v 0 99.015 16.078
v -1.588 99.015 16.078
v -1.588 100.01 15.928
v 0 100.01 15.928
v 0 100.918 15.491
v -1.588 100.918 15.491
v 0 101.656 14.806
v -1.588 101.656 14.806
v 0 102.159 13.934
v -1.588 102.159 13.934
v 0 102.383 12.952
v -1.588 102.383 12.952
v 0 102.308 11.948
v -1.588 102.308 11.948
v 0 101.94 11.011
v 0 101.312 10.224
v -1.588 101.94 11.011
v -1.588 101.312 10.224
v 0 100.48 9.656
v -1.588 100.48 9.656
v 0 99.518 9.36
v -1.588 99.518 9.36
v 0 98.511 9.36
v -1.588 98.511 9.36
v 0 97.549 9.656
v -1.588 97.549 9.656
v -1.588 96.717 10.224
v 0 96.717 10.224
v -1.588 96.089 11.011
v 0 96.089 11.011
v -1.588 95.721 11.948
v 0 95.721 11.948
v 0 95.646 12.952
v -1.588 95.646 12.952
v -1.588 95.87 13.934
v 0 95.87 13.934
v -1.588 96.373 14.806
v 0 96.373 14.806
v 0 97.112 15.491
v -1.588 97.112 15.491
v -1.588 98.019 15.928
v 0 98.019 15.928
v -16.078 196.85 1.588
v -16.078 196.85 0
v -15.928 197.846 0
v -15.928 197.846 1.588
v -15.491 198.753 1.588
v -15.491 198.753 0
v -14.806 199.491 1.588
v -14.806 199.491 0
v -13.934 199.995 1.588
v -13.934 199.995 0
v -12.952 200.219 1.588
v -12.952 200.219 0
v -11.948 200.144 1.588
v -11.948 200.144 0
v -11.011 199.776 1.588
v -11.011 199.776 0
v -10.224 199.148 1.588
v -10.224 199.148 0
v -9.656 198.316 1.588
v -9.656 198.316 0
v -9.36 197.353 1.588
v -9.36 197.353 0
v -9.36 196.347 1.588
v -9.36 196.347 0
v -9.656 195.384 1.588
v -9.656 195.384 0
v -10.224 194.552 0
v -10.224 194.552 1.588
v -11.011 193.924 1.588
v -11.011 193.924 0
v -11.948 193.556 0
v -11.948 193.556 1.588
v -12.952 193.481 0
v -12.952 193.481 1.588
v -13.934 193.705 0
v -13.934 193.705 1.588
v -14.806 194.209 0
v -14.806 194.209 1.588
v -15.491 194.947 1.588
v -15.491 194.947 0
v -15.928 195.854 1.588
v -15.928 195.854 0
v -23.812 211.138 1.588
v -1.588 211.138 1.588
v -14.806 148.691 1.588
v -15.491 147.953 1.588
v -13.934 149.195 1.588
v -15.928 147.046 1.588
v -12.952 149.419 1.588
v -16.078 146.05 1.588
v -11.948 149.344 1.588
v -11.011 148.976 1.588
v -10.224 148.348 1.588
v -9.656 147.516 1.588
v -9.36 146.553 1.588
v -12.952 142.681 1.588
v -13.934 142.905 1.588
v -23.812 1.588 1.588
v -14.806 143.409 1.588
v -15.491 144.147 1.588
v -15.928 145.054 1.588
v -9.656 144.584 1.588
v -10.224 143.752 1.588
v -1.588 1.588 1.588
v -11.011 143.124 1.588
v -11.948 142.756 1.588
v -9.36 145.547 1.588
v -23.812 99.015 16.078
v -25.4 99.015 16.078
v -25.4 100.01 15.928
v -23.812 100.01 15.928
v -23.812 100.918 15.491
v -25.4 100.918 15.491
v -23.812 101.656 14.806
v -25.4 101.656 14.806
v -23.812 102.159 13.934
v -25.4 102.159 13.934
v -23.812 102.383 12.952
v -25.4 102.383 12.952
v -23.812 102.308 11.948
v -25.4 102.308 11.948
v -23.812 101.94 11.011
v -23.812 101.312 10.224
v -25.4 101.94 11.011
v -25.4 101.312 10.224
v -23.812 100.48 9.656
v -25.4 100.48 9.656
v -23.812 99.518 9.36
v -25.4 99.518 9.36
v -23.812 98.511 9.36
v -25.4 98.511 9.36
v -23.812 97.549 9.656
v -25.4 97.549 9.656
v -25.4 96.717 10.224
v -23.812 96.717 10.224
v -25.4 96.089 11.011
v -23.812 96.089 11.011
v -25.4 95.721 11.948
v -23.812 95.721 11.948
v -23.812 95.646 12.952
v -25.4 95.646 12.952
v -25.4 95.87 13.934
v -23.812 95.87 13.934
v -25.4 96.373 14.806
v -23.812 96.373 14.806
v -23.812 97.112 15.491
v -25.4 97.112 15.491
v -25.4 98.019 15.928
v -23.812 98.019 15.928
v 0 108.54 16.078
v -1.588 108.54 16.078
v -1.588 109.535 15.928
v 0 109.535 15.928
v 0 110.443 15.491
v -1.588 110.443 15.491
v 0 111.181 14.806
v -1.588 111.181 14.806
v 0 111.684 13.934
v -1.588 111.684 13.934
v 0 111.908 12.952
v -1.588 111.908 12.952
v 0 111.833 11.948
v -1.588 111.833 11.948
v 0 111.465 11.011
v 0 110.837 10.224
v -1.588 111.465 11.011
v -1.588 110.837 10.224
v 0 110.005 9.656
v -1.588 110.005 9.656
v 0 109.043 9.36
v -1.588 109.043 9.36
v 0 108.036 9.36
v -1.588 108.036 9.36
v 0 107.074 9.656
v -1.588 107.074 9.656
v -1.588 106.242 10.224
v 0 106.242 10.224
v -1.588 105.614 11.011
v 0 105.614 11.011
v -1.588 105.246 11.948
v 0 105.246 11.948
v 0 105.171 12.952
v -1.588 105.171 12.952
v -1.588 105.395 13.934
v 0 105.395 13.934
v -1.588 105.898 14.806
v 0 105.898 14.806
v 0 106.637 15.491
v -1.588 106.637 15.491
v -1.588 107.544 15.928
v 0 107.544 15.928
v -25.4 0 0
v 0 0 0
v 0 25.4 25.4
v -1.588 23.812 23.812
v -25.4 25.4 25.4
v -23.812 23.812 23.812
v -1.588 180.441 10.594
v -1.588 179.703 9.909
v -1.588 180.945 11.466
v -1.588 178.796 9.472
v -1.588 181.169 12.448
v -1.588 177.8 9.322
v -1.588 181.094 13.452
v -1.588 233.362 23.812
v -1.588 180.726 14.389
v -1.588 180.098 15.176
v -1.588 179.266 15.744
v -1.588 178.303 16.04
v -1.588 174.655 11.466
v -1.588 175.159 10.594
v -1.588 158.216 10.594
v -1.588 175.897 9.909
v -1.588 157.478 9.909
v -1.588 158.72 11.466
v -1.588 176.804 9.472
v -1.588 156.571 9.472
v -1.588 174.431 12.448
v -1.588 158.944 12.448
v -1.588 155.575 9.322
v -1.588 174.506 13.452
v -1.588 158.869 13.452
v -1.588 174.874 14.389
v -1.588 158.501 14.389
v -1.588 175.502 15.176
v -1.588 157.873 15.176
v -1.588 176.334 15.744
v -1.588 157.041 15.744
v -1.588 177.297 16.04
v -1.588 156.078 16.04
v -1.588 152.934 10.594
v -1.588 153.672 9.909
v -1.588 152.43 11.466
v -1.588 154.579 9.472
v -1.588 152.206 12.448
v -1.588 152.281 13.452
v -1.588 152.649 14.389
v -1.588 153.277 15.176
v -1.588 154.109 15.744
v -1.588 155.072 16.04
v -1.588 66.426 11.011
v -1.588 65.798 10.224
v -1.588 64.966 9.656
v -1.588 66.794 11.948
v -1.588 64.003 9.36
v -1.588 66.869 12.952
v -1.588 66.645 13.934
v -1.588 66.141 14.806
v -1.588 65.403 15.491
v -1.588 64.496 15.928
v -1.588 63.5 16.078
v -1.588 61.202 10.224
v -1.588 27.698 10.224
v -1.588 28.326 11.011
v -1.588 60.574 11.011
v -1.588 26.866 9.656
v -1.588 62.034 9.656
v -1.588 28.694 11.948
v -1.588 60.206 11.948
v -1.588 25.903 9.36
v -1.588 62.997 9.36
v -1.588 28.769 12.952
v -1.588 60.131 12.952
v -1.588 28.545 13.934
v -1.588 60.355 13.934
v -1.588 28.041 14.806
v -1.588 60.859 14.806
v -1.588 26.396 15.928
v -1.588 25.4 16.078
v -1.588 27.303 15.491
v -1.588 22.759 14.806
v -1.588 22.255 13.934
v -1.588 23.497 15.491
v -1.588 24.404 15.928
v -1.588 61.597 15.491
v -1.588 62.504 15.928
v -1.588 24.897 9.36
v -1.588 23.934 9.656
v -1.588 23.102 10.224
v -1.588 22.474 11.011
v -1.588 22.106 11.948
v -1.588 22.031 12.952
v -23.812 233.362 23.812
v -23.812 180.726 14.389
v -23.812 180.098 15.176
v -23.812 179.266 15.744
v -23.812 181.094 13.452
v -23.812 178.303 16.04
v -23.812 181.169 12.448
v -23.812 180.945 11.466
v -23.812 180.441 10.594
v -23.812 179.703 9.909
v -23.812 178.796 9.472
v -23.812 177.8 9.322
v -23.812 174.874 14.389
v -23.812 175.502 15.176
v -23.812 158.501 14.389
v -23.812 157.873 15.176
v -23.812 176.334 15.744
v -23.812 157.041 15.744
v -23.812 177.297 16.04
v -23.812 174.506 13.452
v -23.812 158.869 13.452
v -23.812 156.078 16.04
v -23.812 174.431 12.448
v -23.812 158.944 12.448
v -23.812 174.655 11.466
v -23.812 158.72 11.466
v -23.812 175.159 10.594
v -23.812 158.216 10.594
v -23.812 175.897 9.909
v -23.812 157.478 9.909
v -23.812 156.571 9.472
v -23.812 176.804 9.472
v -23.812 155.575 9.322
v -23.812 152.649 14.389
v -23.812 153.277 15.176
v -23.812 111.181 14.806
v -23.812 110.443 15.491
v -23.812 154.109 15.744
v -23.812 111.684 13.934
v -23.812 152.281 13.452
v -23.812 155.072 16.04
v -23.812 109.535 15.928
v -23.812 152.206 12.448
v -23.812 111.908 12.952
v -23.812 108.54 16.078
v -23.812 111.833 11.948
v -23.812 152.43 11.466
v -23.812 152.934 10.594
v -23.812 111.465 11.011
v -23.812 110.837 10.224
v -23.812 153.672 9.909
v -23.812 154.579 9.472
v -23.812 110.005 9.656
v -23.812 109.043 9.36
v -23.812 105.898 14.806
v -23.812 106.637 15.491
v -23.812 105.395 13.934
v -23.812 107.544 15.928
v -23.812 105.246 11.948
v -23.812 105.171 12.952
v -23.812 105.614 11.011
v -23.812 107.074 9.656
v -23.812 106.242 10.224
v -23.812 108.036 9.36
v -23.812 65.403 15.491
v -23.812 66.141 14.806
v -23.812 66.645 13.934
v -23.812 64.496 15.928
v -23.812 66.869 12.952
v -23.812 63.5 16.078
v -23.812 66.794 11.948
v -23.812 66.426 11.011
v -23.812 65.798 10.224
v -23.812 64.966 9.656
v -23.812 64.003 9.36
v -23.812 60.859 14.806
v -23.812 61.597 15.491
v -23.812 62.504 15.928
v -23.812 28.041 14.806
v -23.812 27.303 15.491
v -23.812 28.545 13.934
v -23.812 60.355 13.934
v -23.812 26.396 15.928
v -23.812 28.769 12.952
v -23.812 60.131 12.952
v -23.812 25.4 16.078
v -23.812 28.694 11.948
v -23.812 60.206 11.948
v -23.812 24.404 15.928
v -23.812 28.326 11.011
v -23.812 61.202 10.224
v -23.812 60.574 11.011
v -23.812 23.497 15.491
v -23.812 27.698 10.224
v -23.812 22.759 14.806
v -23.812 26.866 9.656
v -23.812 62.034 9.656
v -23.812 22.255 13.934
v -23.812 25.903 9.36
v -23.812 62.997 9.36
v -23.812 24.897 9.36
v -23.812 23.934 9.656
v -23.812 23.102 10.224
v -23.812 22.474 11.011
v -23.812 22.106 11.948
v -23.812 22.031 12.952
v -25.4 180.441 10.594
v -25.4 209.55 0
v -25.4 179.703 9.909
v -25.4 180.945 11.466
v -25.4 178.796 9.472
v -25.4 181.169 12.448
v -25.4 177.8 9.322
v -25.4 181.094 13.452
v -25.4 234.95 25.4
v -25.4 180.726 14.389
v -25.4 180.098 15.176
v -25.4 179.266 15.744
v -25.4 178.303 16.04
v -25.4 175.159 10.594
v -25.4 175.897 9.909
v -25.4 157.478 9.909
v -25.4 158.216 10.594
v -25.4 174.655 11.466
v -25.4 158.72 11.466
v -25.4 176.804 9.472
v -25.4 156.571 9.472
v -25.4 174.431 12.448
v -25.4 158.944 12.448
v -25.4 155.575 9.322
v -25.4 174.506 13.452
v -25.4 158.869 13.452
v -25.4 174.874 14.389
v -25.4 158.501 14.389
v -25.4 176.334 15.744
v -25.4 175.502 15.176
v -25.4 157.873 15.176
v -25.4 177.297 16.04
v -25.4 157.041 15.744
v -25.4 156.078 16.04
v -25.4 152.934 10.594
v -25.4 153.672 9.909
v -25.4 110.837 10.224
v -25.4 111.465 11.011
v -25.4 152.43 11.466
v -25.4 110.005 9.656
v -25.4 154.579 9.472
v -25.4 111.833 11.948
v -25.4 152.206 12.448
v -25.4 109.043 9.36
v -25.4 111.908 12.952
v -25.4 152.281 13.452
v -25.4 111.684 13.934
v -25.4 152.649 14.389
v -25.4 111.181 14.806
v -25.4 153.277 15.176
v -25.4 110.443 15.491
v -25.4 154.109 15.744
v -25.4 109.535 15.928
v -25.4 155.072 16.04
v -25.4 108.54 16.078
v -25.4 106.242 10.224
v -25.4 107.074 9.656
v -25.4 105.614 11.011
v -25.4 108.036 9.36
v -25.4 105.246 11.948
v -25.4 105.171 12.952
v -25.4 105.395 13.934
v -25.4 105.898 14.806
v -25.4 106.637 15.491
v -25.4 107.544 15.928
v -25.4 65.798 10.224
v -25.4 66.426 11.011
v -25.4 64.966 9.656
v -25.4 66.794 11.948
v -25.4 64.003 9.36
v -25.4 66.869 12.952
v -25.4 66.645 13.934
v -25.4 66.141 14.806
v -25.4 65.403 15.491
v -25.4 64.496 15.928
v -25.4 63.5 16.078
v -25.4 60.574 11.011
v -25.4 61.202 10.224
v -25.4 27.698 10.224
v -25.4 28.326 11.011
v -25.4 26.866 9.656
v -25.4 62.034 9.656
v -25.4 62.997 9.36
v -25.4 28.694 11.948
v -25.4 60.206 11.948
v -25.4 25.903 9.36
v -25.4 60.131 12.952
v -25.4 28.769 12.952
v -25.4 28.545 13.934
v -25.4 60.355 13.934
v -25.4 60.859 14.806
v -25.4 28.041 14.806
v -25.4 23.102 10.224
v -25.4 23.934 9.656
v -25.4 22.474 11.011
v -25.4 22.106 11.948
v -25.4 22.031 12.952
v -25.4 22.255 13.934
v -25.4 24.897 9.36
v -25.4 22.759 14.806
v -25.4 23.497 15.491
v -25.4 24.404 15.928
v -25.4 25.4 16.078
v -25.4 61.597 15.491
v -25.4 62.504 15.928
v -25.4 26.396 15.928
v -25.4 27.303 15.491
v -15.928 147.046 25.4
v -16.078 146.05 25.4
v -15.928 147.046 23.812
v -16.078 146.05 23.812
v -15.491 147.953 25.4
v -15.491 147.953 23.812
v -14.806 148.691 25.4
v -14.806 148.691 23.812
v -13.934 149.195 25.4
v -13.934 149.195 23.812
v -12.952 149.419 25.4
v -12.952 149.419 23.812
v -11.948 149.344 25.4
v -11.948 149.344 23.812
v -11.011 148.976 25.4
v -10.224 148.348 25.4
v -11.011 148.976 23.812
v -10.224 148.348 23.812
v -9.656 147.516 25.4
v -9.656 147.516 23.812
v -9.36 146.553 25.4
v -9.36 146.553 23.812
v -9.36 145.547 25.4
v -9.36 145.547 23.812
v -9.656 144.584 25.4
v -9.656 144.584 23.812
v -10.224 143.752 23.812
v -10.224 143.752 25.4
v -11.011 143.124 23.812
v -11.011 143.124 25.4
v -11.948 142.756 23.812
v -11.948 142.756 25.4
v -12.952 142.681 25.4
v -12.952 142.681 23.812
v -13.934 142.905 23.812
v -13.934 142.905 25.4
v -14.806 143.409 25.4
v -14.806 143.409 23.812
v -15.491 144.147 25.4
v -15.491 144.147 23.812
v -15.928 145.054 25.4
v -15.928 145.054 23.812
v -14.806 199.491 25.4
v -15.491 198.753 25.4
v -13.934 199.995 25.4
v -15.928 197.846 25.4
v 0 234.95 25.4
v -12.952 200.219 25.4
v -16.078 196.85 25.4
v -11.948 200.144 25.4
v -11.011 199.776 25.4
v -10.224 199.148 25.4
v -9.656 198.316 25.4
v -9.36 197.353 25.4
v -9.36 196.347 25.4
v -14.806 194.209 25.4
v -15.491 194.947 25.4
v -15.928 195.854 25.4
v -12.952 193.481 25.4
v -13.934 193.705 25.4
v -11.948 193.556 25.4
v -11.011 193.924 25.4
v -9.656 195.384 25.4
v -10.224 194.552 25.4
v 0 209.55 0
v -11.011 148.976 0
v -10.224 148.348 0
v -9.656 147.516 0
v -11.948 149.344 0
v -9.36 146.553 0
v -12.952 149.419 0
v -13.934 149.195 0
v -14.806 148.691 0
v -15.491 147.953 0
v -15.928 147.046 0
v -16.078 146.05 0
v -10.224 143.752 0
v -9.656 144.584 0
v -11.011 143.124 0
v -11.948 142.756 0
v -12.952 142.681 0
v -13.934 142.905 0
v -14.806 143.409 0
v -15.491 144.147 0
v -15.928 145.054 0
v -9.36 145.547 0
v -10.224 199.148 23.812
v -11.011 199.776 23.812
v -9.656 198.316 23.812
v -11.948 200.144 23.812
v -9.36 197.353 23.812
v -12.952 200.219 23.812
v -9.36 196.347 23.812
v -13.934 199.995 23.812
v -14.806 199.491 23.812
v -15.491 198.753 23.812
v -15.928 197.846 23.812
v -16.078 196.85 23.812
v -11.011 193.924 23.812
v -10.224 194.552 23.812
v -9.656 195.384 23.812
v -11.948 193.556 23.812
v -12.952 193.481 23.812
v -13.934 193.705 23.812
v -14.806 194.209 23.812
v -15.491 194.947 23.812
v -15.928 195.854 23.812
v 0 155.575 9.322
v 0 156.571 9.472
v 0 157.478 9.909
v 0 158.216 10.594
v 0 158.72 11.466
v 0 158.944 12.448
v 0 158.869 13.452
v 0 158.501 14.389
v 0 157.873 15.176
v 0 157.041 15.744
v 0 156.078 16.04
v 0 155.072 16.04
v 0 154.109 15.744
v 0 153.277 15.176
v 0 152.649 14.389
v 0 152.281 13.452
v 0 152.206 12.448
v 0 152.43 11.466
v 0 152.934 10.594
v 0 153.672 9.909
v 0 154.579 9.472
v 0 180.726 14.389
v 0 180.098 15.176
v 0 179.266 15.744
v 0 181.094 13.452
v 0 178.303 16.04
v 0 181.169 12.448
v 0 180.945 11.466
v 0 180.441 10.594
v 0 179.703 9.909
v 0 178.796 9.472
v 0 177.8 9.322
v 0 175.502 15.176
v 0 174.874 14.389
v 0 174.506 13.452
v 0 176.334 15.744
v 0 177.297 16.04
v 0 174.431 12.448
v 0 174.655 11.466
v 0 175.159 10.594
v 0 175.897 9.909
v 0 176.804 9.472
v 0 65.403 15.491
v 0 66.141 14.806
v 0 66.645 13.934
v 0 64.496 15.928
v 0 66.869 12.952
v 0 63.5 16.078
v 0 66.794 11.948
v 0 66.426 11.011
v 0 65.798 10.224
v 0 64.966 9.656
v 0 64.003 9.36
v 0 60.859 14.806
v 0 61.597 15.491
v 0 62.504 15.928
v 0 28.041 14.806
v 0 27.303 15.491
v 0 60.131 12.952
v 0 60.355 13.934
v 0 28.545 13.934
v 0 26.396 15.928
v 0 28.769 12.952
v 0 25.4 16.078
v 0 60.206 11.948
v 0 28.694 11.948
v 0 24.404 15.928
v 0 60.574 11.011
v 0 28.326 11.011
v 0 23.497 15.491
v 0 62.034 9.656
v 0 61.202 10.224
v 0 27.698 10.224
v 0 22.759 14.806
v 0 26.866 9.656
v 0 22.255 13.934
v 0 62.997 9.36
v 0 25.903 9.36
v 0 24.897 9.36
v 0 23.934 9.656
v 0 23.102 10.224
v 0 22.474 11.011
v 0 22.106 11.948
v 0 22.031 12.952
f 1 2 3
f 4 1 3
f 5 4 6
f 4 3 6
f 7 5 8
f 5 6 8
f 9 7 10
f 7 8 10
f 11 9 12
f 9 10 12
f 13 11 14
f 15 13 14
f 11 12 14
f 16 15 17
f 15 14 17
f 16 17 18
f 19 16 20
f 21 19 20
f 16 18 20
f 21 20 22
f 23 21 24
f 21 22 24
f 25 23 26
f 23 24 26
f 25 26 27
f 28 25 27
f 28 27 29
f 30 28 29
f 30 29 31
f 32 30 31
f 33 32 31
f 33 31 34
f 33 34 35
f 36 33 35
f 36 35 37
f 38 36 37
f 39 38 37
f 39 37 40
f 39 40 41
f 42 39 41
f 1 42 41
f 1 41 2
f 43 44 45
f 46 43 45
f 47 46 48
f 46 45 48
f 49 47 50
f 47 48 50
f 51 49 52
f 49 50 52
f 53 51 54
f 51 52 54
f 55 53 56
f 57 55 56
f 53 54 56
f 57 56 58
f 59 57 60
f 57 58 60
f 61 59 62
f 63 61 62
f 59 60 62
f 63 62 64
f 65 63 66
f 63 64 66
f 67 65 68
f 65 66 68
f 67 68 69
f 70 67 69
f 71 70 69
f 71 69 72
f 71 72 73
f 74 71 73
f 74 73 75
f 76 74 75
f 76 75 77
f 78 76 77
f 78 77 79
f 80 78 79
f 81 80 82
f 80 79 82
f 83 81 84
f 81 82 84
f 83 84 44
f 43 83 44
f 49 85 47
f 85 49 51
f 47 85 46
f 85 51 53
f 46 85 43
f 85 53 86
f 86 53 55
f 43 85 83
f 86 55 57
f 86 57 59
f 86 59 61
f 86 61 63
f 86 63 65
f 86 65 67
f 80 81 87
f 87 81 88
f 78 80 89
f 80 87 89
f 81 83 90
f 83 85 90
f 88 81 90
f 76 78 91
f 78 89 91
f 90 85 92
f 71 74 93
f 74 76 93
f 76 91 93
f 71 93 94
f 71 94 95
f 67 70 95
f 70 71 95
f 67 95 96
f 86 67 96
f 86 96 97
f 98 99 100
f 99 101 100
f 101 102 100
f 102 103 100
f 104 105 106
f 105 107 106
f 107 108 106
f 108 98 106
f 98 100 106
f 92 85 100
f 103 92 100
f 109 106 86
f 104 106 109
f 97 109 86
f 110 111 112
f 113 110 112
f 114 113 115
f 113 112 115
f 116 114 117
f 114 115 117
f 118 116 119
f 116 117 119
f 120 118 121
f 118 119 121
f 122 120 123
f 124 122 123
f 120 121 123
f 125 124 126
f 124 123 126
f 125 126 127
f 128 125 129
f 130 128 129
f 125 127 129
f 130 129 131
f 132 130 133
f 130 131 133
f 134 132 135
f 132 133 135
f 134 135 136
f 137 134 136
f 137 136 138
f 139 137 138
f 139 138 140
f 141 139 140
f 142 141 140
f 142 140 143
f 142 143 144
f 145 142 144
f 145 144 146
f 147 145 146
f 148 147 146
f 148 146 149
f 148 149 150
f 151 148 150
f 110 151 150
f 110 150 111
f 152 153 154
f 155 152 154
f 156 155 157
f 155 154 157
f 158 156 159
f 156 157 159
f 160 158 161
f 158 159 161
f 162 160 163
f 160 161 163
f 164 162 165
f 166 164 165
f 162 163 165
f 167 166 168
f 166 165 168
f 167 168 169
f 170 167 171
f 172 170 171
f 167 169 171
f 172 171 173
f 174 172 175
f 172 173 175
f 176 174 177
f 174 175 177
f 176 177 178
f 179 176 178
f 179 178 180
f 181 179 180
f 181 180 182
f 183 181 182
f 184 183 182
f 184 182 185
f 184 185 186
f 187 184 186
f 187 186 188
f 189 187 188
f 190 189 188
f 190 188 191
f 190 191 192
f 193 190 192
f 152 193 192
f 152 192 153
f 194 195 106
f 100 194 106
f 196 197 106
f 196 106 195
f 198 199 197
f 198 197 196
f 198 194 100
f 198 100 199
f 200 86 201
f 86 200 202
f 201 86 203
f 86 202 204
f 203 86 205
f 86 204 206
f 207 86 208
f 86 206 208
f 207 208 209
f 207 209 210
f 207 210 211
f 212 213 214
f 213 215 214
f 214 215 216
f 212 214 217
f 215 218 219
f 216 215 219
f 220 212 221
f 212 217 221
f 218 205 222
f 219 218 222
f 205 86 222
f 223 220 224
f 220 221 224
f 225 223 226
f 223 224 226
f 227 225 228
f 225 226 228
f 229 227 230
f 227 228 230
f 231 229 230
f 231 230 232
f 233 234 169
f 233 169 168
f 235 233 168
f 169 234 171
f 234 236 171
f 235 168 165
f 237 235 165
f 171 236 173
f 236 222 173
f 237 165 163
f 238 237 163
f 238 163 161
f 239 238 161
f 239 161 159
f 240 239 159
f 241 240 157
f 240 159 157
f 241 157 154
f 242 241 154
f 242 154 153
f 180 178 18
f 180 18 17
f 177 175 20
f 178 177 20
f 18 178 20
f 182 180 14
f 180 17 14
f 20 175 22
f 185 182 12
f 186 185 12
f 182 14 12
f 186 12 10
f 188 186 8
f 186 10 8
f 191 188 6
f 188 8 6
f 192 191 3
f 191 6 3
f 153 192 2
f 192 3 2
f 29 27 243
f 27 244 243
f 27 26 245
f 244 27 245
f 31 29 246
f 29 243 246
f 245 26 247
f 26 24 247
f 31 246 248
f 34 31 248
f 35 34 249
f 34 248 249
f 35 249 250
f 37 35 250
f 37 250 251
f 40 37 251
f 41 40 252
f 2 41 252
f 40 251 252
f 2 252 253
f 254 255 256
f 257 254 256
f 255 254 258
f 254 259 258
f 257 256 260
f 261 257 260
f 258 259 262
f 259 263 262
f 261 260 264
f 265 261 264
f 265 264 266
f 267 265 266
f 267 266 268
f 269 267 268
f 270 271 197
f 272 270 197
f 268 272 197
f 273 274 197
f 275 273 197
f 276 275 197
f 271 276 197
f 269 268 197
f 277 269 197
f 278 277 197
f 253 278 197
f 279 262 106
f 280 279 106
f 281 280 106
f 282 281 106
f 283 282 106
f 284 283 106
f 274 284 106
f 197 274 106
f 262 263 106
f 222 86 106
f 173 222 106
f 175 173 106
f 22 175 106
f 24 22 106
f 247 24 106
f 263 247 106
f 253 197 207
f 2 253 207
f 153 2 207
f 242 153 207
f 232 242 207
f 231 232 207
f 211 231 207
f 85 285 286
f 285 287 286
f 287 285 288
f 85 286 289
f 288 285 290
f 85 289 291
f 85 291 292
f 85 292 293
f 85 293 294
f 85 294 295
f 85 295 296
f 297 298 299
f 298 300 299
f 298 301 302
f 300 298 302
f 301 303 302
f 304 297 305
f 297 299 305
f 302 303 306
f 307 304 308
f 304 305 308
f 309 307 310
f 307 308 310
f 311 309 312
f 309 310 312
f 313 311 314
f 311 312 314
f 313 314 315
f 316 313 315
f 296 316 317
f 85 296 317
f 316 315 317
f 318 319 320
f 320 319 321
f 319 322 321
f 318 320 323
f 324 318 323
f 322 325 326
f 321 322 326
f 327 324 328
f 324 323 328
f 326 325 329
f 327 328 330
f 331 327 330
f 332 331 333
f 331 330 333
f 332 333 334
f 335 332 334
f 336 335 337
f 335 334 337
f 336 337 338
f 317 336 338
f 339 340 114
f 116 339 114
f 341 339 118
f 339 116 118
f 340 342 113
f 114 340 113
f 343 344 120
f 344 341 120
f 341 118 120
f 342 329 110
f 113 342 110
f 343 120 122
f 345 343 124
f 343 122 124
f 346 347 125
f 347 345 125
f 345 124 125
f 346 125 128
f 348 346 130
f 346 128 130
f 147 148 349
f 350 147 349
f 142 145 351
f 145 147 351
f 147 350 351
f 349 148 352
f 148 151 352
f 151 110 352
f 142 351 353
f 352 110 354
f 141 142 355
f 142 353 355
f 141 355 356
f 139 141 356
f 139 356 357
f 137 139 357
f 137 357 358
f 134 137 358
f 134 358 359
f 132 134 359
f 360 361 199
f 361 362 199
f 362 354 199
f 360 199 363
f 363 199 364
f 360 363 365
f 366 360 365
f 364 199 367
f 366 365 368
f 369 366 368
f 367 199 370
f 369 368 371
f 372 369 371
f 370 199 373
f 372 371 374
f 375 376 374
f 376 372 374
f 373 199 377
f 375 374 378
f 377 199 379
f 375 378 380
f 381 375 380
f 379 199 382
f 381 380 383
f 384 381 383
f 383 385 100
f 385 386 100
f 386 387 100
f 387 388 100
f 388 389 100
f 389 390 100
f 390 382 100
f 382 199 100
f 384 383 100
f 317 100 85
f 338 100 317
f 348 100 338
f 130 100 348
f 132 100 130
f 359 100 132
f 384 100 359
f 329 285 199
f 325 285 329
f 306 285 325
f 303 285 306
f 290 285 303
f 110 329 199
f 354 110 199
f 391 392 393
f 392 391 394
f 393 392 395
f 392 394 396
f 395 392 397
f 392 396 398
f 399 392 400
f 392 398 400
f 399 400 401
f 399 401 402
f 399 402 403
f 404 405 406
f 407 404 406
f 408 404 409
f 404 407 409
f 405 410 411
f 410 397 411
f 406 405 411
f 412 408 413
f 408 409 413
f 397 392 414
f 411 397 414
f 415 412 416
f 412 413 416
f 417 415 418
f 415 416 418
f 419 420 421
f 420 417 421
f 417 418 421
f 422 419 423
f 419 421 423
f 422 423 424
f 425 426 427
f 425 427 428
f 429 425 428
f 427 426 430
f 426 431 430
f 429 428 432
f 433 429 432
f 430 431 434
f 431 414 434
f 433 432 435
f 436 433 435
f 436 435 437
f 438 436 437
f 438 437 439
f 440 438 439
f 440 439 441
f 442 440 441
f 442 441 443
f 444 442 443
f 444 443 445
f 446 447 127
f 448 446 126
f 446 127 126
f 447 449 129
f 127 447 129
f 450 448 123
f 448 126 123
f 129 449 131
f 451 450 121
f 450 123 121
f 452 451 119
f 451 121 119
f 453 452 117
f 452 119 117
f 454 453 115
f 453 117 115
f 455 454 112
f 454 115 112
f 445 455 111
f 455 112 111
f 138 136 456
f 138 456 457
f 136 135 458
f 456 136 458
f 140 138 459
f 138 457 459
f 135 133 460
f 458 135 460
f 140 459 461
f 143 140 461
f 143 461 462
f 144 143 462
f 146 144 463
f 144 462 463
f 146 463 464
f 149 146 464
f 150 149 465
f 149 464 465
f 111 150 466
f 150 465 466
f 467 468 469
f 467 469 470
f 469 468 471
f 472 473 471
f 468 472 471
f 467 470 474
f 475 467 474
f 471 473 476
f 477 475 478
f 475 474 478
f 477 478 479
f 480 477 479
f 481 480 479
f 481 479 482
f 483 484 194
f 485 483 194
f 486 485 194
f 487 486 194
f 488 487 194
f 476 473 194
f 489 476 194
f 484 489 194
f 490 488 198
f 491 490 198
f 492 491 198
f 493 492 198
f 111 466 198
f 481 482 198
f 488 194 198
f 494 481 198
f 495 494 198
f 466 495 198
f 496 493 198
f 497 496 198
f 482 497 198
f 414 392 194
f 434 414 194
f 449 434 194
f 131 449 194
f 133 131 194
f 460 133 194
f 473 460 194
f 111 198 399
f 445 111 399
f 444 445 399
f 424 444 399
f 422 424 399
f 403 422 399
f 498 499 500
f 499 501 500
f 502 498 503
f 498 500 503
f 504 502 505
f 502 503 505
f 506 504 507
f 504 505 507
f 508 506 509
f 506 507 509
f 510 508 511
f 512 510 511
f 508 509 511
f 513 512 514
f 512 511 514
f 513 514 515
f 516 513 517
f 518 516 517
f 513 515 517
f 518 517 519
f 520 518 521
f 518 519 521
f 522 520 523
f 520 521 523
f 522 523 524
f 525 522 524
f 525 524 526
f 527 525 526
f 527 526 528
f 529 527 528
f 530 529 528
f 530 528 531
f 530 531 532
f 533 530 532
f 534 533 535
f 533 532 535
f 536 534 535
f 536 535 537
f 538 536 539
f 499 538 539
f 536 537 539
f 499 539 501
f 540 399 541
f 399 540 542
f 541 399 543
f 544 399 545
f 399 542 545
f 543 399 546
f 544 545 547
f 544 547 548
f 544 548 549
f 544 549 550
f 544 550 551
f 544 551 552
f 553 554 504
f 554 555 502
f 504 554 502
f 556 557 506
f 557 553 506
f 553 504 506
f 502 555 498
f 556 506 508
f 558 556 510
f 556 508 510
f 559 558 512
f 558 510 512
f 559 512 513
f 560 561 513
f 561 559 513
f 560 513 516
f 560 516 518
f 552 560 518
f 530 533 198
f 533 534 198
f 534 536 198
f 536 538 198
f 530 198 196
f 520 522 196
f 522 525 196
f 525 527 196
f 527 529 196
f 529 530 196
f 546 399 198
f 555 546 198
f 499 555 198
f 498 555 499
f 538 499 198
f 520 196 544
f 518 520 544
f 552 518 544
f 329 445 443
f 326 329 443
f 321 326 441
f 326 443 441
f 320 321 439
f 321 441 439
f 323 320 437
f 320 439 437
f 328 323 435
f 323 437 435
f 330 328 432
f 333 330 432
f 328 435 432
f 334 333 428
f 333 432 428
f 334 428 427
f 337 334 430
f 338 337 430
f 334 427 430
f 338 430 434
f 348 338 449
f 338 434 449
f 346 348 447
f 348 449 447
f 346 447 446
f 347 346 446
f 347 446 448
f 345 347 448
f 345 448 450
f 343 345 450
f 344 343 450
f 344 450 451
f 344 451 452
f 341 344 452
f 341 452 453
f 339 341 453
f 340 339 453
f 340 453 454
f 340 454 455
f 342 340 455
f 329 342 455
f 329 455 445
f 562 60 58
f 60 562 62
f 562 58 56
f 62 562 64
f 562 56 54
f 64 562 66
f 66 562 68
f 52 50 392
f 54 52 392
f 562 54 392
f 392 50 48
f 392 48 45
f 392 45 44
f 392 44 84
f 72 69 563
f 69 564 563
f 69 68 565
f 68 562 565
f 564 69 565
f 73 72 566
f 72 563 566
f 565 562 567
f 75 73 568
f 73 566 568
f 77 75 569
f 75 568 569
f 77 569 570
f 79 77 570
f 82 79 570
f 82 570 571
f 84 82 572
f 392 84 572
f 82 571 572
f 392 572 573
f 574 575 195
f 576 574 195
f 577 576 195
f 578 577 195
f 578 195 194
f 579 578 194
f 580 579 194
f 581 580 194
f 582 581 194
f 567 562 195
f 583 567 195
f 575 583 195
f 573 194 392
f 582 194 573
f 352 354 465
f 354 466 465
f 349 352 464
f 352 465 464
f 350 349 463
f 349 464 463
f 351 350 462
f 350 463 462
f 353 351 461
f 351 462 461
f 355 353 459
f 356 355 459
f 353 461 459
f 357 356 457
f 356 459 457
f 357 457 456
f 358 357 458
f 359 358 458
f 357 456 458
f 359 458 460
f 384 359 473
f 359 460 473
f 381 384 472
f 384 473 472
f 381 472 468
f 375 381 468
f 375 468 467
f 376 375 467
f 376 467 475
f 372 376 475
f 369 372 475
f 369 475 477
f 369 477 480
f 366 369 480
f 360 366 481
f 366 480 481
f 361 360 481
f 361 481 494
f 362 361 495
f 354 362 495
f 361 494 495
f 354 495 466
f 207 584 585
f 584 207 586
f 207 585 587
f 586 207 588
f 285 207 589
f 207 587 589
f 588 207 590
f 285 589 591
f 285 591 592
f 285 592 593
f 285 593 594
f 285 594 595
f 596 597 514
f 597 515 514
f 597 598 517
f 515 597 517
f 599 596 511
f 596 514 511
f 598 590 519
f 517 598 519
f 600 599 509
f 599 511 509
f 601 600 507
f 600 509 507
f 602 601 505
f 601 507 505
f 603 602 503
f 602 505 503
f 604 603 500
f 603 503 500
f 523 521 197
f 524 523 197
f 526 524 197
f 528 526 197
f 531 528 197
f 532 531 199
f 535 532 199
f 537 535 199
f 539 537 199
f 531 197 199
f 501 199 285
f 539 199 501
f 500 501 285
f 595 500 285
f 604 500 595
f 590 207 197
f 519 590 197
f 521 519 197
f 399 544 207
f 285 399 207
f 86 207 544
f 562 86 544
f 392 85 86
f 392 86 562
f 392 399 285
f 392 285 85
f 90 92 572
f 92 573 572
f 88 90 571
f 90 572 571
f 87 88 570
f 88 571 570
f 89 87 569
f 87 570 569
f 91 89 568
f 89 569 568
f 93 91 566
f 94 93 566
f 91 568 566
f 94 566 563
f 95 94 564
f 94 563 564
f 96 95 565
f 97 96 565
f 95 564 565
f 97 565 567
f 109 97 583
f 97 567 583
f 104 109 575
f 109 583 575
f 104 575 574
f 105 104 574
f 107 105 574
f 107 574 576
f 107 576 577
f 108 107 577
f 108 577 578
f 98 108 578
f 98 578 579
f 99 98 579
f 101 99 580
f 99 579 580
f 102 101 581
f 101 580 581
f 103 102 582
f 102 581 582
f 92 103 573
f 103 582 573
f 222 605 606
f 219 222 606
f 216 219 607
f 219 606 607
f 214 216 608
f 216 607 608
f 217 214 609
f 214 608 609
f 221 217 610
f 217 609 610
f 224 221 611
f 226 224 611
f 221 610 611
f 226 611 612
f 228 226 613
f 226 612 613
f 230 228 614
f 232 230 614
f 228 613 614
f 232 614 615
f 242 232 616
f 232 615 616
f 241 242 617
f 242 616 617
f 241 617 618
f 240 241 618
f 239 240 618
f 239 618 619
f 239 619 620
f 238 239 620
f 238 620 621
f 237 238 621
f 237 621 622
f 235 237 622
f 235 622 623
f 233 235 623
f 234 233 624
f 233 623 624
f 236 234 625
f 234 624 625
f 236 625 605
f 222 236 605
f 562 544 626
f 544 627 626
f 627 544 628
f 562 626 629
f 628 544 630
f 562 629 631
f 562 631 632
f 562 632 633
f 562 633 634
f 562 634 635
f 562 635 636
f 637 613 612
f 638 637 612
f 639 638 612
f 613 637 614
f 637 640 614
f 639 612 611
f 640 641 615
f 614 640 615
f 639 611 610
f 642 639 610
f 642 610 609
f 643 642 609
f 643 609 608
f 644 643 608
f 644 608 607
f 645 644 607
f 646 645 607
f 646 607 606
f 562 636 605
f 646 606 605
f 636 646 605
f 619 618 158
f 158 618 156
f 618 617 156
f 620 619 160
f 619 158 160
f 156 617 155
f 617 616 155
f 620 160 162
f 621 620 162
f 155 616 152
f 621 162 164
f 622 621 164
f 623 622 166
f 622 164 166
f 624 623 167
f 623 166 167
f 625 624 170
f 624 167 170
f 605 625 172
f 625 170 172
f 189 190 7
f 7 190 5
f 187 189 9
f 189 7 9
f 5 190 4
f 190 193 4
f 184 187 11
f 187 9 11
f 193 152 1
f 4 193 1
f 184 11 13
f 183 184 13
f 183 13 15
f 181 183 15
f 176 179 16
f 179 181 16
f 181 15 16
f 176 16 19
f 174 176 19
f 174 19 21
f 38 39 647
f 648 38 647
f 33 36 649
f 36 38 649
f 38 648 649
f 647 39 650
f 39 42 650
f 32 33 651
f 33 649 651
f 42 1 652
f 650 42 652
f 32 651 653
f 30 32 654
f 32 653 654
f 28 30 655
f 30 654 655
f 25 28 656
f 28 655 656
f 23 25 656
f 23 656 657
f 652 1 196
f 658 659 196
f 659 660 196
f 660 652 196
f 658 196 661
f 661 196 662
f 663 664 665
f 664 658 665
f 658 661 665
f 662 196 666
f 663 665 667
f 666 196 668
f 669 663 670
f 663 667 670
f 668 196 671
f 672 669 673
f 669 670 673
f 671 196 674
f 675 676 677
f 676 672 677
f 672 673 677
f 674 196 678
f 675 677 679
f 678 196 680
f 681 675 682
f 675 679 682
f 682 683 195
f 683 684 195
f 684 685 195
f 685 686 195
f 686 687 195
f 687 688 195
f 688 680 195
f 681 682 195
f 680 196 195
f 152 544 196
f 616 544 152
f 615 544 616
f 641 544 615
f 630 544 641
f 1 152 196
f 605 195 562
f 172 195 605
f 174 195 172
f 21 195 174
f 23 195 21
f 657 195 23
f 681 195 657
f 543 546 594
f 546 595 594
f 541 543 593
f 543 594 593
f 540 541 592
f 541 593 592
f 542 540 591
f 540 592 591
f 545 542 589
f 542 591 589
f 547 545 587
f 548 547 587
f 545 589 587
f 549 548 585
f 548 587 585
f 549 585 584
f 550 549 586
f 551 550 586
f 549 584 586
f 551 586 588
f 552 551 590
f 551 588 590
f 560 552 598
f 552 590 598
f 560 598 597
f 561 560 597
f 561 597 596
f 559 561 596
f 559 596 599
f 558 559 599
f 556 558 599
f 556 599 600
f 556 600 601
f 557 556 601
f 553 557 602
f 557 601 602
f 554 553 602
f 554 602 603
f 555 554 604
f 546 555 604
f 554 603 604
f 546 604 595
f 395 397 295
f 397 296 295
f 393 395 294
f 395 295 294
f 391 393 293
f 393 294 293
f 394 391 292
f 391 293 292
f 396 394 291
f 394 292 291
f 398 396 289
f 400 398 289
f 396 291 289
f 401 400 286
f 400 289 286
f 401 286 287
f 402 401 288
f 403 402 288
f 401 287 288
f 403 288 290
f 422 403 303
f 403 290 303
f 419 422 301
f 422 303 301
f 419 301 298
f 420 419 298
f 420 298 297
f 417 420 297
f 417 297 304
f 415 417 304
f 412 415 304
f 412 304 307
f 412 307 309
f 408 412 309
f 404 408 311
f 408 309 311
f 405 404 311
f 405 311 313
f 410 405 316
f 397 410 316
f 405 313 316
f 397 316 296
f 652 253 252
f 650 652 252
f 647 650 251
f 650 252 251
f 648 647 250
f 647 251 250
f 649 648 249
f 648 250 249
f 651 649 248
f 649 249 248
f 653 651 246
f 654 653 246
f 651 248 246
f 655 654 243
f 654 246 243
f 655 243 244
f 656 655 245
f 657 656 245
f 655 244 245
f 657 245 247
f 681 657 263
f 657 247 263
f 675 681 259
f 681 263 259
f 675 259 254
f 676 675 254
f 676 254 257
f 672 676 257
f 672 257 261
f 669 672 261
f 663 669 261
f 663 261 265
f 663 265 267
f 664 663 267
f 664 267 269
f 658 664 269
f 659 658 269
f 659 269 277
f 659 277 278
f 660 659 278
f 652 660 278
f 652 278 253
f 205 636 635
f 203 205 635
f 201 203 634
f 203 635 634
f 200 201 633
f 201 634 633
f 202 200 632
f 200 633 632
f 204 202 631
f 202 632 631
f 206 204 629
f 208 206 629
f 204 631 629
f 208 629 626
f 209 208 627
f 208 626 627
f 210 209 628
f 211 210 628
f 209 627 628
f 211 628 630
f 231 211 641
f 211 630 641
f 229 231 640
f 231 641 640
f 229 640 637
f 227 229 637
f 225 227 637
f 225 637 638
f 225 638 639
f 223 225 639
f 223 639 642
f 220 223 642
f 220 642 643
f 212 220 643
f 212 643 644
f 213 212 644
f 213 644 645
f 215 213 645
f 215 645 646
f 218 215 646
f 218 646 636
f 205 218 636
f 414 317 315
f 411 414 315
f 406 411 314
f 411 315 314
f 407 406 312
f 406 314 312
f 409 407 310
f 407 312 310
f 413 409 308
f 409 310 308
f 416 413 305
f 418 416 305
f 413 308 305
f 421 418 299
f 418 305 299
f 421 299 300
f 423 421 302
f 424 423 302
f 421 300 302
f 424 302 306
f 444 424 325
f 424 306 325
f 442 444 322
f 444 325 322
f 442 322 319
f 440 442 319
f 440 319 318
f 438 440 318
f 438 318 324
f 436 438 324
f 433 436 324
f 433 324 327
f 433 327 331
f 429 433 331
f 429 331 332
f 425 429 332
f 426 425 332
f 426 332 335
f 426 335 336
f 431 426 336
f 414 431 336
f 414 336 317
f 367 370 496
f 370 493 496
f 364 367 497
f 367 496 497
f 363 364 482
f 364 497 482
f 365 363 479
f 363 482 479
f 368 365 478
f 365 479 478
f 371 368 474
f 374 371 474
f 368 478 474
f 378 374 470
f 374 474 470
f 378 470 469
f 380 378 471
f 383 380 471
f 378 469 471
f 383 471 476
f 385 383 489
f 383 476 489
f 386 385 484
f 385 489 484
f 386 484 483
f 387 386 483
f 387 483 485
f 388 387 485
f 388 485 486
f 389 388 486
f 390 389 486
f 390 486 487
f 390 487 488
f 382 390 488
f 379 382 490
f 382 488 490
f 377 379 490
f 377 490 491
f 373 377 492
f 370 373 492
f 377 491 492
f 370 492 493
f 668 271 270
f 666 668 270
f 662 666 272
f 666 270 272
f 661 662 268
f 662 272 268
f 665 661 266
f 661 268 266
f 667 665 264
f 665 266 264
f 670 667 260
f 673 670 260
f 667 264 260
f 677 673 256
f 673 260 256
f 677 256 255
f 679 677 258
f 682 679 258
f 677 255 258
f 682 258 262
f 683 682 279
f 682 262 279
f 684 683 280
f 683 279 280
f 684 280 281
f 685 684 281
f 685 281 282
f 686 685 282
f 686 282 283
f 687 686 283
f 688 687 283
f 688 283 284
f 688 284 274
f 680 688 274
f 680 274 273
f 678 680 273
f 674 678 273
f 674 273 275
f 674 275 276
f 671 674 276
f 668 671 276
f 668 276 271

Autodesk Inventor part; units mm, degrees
ref_plane "YZ Plane" through (0, 0, 0) normal (1, 0, 0) x (0, 1, 0)
ref_plane "XZ Plane" through (0, 0, 0) normal (0, 1, 0) x (-1, 0, 0)
ref_plane "XY Plane" through (0, 0, 0) normal (0, 0, 1) x (1, 0, 0)
sketch "Sketch1" plane through (0, 0, 0) normal (0, 1, 0) x (-1, 0, 0)
  line L0 (0, 0) -> (25.4, 0)
  line L1 (25.4, 0) -> (25.4, 25.4)
  line L2 (25.4, 25.4) -> (0, 25.4)
  line L3 (0, 25.4) -> (0, 0)
  line L4 (1.5875, 23.8125) -> (23.8125, 23.8125)
  line L5 (23.8125, 23.8125) -> (23.8125, 1.5875)
  line L6 (23.8125, 1.5875) -> (1.5875, 1.5875)
  line L7 (1.5875, 1.5875) -> (1.5875, 23.8125)
  dimension "d0" = 25.4
  dimension "d2" = 25.4
  dimension "d3" = 1.5875
extrude "Extrusion1" add sketch "Sketch1" along normal blind 254
sketch "Sketch2" plane through (-25.4, 0, 0) normal (-1, 0, 0) x (0, 0, 1)
  line L0 (0, 254) -> (25.4, 254) projected
  line L1 (0, 0) -> (0, 254) projected
  line L2 (25.4, 0) -> (25.4, 254) projected
  line L3 (25.4, 234.95) -> (0, 209.55)
  point P0 (0, 228.6)
  dimension "d6" = 25.4
  dimension "d13" = 25.4
  dimension "d14" = 19.05
extrude "Extrusion2" cut sketch "Sketch2" against normal blind 25.4
sketch "Sketch3" plane through (-25.4, 0, 0) normal (-1, 0, 0) x (0, 0, 1)
  line L0 (25.4, 254) -> (0, 228.6) projected
  line L1 (0, 0) -> (25.4, 0) projected
  line L2 (25.4, 0) -> (25.4, 234.95) projected
  line L3 (0, 0) -> (25.4, 25.4)
extrude "Extrusion3" cut sketch "Sketch3" against normal blind 25.4
sketch "Sketch4" plane through (-25.4, 25.4, 25.4) normal (-1, 0, 0) x (0, 0, 1)
  circle A0 centre (-12.7, 38.1) radius 3.3782 projected
  circle A1 centre (-12.7, 0) radius 3.3782 projected
extrude "Extrusion4" cut sketch "Sketch4" against normal blind 25.4
sketch "Sketch5" plane through (0, 209.55, 0) normal (0, 0, -1) x (-1, 0, 0)
  circle A0 centre (12.7, -12.7) radius 3.3782 projected
  circle A1 centre (12.7, -63.5) radius 3.3782 projected
extrude "Extrusion5" cut sketch "Sketch5" against normal blind 25.4
sketch "Sketch6" plane through (0, 0, 0) normal (1, 0, 0) x (0, 0, -1)
  circle A0 centre (-12.7, 177.8) radius 3.3782 projected
  circle A1 centre (-12.7, 155.575) radius 3.3782 projected
extrude "Extrusion6" cut sketch "Sketch6" against normal blind 25.4
sketch "Sketch7" plane through (-25.4, 25.4, 25.4) normal (-1, 0, 0) x (0, 0, 1)
  circle A0 centre (-12.7, 83.1396) radius 3.3782 projected
  circle A1 centre (-12.7, 73.6146) radius 3.3782 projected
extrude "Extrusion7" cut sketch "Sketch7" against normal blind 25.4
properties part number "Square Tube 3" material "Aluminum 6061"
